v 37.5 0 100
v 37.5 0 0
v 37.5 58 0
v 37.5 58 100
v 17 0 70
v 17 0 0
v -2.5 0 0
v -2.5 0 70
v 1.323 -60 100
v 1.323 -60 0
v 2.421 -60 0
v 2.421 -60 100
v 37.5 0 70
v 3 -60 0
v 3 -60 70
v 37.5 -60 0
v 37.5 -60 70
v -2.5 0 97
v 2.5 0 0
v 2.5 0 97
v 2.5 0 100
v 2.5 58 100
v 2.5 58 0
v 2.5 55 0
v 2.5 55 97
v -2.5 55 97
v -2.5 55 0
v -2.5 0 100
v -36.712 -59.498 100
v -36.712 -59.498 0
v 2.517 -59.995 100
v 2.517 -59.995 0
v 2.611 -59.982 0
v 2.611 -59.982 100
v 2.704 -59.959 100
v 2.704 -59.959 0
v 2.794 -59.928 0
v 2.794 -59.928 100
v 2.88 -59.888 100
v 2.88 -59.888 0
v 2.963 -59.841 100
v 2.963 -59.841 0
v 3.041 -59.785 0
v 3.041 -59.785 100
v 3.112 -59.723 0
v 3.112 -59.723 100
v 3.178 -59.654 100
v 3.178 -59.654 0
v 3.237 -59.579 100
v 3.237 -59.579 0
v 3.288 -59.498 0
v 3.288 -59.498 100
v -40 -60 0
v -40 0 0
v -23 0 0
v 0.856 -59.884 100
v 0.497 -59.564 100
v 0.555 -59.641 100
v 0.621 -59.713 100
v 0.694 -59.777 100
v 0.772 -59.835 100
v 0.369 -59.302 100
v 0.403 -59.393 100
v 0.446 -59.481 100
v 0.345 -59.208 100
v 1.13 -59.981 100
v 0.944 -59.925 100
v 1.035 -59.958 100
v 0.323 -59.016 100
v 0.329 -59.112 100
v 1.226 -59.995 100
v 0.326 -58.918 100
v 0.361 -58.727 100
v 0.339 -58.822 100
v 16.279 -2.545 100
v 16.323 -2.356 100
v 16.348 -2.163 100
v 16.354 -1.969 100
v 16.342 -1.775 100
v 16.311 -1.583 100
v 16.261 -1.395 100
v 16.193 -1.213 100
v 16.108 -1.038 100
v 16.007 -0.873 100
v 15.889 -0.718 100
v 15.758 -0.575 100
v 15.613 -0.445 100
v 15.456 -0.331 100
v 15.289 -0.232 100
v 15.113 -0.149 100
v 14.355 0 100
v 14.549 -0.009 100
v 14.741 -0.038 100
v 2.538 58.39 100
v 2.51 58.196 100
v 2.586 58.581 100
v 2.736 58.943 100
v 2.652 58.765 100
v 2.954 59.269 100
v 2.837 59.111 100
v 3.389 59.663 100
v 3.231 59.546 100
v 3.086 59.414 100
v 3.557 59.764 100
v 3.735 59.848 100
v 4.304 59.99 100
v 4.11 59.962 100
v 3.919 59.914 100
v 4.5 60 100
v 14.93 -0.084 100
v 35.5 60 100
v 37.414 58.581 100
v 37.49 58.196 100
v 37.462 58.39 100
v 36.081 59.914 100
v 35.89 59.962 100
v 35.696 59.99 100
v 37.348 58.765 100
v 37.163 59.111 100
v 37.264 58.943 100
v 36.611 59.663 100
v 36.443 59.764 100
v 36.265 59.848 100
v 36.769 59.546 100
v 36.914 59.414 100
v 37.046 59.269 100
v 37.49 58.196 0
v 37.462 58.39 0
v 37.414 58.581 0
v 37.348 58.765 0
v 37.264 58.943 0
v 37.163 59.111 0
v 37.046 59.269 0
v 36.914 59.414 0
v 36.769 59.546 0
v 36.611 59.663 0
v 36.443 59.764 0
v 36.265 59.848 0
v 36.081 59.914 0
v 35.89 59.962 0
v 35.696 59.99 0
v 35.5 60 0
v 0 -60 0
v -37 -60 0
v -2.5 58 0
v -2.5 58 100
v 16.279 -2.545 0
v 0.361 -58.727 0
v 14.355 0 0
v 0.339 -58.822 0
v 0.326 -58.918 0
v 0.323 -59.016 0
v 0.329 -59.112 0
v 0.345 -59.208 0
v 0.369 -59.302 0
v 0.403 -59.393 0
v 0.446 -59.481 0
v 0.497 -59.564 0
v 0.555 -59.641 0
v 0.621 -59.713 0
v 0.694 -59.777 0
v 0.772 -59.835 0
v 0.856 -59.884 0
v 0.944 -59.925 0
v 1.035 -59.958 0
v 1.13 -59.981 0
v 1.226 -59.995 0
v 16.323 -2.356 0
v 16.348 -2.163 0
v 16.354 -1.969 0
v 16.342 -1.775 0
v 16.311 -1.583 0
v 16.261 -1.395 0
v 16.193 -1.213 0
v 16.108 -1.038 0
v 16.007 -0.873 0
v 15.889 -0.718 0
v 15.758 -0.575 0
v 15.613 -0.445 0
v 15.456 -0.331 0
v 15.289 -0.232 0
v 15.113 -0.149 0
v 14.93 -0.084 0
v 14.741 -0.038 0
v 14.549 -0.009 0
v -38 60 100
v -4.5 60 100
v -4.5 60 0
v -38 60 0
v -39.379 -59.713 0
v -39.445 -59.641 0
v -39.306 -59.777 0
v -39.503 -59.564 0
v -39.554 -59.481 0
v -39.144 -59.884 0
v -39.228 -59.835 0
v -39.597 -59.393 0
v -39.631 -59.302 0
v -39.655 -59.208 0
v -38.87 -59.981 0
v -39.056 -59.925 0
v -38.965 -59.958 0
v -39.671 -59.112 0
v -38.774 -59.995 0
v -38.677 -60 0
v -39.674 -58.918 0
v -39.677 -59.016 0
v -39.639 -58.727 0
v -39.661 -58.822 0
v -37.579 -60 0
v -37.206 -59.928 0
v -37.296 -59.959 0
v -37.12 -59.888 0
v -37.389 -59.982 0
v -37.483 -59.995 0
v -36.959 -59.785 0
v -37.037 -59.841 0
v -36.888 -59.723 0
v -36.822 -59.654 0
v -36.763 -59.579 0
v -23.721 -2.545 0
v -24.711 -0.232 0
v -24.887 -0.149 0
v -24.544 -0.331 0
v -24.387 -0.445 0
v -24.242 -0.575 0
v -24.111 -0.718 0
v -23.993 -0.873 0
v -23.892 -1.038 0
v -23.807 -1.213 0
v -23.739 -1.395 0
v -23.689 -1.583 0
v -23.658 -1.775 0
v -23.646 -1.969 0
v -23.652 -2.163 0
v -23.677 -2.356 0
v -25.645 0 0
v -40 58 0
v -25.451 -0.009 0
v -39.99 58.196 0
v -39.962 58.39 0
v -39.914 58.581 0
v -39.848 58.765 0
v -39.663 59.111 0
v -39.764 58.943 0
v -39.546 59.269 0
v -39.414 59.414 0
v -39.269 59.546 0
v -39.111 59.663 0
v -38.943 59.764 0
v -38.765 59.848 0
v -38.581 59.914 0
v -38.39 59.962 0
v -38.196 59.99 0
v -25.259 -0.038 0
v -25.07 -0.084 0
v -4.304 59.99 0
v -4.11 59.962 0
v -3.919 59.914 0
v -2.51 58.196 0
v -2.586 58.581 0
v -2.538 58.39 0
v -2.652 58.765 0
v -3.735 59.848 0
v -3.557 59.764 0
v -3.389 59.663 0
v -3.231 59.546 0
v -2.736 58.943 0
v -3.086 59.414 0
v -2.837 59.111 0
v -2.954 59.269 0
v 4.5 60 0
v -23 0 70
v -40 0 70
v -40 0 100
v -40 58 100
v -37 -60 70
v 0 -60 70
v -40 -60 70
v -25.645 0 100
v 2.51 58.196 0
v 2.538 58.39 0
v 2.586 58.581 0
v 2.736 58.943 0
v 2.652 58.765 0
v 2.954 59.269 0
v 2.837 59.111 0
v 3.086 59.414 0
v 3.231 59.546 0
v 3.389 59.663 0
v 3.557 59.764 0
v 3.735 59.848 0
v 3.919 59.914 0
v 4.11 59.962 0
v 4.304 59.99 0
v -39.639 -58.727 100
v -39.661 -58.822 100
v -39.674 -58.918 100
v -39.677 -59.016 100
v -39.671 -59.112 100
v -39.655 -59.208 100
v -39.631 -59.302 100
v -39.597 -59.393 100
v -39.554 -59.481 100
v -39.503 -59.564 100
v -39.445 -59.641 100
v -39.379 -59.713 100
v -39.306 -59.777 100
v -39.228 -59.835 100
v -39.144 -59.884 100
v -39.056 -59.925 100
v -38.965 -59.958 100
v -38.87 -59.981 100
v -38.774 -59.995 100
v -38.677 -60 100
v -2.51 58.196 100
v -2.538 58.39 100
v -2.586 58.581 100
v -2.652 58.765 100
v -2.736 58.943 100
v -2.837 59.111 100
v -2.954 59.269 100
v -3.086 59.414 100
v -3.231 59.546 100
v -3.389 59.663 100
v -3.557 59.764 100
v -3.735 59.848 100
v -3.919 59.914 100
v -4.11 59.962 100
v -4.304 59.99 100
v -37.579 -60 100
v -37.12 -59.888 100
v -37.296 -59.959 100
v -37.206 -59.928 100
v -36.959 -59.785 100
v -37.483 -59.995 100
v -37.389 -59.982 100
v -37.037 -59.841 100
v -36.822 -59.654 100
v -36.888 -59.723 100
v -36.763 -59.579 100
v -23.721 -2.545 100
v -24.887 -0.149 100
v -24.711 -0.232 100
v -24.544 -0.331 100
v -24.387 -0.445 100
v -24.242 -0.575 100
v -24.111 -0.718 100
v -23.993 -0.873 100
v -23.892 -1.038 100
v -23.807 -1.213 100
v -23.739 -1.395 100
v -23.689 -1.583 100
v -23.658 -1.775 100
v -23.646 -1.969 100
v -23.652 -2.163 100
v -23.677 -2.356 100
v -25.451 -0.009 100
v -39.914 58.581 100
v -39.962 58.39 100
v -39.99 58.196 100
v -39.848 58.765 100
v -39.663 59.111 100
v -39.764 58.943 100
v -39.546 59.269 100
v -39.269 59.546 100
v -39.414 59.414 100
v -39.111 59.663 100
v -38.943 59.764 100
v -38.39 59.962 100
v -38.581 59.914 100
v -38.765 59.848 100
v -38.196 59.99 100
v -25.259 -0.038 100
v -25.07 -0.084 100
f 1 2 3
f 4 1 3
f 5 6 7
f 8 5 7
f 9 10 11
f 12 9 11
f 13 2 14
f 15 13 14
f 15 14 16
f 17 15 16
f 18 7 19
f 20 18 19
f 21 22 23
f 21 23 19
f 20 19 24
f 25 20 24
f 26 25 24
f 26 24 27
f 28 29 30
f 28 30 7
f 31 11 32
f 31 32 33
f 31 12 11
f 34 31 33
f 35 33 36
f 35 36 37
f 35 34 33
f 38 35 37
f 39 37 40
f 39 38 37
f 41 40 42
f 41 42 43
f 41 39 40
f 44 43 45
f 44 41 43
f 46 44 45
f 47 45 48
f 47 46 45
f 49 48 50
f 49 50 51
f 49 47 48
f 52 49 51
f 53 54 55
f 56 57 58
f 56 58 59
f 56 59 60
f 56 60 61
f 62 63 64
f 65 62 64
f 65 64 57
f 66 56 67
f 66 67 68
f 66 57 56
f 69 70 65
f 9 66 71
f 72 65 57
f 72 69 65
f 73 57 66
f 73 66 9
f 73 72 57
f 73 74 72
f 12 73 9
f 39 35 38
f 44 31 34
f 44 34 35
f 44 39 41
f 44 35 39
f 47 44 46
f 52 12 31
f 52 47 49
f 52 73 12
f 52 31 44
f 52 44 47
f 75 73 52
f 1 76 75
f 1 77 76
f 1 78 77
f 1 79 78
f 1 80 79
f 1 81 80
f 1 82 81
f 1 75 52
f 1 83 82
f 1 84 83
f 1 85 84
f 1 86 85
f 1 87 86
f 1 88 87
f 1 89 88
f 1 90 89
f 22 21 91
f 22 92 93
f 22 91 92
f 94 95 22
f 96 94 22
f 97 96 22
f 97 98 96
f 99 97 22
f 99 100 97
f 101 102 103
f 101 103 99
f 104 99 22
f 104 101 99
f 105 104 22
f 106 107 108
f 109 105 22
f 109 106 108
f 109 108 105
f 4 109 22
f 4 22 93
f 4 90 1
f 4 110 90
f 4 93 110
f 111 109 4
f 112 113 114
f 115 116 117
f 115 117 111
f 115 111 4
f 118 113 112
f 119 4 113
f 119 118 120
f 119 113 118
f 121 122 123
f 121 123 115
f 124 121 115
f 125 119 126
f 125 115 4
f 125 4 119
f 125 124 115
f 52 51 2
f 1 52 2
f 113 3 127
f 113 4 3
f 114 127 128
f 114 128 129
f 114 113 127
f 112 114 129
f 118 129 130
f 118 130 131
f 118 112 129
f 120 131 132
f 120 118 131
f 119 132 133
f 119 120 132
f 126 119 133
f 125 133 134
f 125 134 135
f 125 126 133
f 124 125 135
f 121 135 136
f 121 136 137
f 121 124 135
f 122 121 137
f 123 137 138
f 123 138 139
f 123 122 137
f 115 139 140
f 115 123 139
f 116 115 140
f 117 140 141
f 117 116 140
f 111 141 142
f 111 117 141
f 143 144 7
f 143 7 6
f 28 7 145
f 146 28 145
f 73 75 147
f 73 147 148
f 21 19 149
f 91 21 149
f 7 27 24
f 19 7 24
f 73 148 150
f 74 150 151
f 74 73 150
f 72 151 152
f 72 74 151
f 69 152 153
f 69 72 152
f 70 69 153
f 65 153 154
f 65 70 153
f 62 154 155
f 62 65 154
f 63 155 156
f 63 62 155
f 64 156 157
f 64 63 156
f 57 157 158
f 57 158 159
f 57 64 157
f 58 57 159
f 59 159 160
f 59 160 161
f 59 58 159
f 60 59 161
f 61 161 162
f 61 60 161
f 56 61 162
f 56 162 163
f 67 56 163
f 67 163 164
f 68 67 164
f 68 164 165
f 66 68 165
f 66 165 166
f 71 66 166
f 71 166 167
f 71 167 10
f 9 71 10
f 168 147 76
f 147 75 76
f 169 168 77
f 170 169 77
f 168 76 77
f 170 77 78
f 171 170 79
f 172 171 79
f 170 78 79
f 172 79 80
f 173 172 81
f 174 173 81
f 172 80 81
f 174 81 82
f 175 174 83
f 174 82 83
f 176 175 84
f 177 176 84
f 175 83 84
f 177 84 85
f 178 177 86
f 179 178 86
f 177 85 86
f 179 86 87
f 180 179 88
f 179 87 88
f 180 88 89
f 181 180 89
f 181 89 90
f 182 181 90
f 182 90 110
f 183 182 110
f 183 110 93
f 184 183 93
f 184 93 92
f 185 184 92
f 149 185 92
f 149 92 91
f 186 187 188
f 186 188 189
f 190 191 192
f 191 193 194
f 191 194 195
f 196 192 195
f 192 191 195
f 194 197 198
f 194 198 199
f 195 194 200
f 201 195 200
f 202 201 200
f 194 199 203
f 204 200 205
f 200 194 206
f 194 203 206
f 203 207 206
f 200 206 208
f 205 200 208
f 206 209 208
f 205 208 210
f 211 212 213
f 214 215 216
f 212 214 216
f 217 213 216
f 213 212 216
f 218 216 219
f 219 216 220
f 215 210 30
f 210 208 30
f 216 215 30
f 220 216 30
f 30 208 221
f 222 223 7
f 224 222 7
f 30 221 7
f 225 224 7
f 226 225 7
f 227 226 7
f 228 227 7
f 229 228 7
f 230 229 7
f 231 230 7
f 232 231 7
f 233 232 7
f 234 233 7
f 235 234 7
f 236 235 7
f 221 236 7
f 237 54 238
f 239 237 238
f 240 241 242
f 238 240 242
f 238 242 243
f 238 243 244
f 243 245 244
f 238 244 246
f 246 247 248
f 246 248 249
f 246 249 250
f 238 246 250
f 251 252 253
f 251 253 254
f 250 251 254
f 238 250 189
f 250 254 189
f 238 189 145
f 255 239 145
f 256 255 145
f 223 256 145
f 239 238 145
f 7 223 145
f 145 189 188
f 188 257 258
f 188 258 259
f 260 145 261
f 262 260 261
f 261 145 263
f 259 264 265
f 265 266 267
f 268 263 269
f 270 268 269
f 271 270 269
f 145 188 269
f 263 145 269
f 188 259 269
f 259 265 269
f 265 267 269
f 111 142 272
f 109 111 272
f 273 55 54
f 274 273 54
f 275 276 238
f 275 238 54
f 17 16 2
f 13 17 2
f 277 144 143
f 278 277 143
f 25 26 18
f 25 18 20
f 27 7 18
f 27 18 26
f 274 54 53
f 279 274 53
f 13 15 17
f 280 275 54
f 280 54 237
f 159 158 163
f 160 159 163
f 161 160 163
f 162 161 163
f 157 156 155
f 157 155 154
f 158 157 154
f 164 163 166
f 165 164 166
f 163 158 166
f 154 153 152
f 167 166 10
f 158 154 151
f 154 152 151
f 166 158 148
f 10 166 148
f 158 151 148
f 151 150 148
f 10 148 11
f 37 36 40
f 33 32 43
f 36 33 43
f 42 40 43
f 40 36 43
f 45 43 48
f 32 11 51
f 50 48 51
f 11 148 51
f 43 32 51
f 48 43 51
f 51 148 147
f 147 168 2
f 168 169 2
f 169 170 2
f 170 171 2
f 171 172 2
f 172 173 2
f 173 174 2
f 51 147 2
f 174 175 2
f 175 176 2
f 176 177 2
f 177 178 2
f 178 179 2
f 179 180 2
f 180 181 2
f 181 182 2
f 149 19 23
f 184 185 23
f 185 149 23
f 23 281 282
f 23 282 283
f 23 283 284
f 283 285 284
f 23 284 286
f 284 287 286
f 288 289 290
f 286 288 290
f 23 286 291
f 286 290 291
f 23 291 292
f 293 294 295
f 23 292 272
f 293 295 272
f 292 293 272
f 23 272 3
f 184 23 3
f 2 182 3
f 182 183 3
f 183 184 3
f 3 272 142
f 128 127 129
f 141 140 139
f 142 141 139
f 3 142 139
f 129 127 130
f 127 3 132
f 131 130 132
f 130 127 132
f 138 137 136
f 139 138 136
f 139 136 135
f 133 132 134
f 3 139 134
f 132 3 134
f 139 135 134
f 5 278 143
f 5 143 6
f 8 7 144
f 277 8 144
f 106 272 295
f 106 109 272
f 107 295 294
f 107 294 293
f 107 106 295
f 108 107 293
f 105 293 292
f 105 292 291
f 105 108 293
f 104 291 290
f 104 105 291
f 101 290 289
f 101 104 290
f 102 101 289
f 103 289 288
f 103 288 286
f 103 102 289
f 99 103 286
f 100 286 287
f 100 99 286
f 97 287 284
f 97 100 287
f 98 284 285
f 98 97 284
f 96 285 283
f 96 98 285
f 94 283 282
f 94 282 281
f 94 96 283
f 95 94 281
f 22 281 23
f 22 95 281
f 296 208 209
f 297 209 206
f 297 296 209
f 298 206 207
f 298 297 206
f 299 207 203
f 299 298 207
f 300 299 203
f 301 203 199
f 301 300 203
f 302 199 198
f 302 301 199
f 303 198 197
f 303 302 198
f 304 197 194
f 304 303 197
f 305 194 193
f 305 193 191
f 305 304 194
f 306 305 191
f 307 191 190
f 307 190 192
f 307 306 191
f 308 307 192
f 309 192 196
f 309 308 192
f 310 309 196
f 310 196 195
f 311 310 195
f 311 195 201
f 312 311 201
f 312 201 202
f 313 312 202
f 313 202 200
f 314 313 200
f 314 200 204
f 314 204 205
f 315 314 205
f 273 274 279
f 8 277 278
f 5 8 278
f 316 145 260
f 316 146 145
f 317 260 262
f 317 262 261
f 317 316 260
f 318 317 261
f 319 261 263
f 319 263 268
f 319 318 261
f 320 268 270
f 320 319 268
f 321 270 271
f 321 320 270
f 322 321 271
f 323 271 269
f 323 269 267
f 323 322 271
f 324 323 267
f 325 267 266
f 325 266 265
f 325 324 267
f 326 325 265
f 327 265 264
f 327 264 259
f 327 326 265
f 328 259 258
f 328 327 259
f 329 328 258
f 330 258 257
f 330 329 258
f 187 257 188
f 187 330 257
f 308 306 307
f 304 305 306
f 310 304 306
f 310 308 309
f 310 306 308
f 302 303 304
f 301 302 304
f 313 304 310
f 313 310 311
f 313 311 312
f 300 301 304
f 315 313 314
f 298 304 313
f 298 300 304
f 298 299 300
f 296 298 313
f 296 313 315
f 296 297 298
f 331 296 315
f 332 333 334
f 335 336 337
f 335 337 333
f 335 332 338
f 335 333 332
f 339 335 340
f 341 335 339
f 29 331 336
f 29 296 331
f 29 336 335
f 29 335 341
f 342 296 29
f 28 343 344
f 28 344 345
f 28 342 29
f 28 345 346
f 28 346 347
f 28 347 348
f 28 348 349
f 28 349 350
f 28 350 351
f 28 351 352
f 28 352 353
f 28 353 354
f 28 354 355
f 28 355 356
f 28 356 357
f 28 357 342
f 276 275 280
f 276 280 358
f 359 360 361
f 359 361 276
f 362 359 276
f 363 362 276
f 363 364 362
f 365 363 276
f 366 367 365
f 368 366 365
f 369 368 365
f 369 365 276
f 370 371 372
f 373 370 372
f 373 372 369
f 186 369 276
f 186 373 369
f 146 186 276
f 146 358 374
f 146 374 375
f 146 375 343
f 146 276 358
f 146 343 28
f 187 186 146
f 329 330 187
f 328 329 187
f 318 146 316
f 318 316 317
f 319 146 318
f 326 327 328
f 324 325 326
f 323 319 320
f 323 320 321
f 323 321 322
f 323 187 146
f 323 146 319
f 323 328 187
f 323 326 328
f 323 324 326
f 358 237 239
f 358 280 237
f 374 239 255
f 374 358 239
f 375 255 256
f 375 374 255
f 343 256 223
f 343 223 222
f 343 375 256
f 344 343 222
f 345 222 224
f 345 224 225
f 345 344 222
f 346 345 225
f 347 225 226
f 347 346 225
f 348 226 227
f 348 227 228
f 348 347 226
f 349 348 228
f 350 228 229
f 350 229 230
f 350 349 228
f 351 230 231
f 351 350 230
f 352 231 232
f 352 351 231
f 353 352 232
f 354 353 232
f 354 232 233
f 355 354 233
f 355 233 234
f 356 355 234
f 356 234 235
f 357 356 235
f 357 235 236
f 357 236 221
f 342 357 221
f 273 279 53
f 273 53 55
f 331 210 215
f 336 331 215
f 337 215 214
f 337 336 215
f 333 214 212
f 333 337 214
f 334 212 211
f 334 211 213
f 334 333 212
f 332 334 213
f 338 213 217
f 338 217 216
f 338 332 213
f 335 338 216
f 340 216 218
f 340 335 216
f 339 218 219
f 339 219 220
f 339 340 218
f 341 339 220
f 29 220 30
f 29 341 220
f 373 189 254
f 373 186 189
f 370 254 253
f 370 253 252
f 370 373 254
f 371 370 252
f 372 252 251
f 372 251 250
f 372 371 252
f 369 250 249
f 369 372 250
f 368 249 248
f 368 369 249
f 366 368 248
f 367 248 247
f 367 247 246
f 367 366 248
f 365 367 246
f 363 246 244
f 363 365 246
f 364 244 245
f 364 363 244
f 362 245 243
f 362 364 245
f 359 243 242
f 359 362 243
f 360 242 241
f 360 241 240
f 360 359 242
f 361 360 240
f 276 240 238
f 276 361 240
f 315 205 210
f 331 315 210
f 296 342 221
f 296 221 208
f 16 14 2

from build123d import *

# Parameters (mm, degrees)
F1_DEPTH  = 100
F2_DEPTH  = 70
F0_W      = 5
F0_H      = 60
F3_DEPTH  = 97
F3_FACE_W = 5
F3_FACE_H = 97
F4_DEPTH  = 5
F5_R      = 2
F6_R      = 2
F7_R      = 2
F8_R      = 2
F9_R      = 1
F10_R     = 1
F11_R     = 1


with BuildPart() as f1:
    # F0 (on Top) → F1 (new body)
    with BuildSketch(Plane.XY):
        Polygon((-2.5, 0), (-2.5, 60), (-40, 60), (-40, 0), (-23, 0), (-40, -60), (-37, -60), align=None)
        Polygon((37.5, 0), (37.5, 60), (2.5, 60), (2.5, 0), (17, 0), (0, -60), (3, -60), align=None)
    extrude(amount=F1_DEPTH)

    # F5
    f5_edges = [f1.edges().sort_by_distance(p)[0] for p in [
        (-2.5, 60, 50),
    ]]
    fillet(f5_edges, radius=F5_R)

    # F6
    f6_edges = [f1.edges().sort_by_distance(p)[0] for p in [
        (-40, 60, 50),
    ]]
    fillet(f6_edges, radius=F6_R)

    # F7
    f7_edges = [f1.edges().sort_by_distance(p)[0] for p in [
        (2.5, 60, 50),
        (37.5, 60, 50),
    ]]
    fillet(f7_edges, radius=F7_R)

    # F8
    f8_edges = [f1.edges().sort_by_distance(p)[0] for p in [
        (-23, 0, 50),
        (17, 0, 50),
    ]]
    fillet(f8_edges, radius=F8_R)

    # F9
    f9_edges = [f1.edges().sort_by_distance(p)[0] for p in [
        (-40, -60, 50),
    ]]
    fillet(f9_edges, radius=F9_R)

    # F10
    f10_edges = [f1.edges().sort_by_distance(p)[0] for p in [
        (0, -60, 50),
    ]]
    fillet(f10_edges, radius=F10_R)

    # F11
    f11_edges = [f1.edges().sort_by_distance(p)[0] for p in [
        (-37, -60, 50),
        (3, -60, 50),
    ]]
    fillet(f11_edges, radius=F11_R)


with BuildPart() as f2:
    # F0 (on Top) → F2 (new body)
    with BuildSketch(Plane.XY):
        Polygon((-23, 0), (-40, 0), (-40, -60), align=None)
        Polygon((17, 0), (2.5, 0), (-2.5, 0), (-37, -60), (0, -60), align=None)
        Polygon((37.5, -60), (37.5, 0), (3, -60), align=None)
    extrude(amount=F2_DEPTH)


with BuildPart() as f3:
    # F0 (on Top) → F3 (new body)
    with BuildSketch(Plane.XY):
        with Locations((0, 30)):
            Rectangle(F0_W, F0_H)
    extrude(amount=F3_DEPTH)

    # F3_face (on face) → F4 (cut)
    with BuildSketch(Plane(origin=(0, 60, 48.5), x_dir=(-1, 0, 0), z_dir=(0, 1, 0))):
        Rectangle(F3_FACE_W, F3_FACE_H)
    extrude(amount=-F4_DEPTH, mode=Mode.SUBTRACT)


solid = Compound([f1.part, f2.part, f3.part])
